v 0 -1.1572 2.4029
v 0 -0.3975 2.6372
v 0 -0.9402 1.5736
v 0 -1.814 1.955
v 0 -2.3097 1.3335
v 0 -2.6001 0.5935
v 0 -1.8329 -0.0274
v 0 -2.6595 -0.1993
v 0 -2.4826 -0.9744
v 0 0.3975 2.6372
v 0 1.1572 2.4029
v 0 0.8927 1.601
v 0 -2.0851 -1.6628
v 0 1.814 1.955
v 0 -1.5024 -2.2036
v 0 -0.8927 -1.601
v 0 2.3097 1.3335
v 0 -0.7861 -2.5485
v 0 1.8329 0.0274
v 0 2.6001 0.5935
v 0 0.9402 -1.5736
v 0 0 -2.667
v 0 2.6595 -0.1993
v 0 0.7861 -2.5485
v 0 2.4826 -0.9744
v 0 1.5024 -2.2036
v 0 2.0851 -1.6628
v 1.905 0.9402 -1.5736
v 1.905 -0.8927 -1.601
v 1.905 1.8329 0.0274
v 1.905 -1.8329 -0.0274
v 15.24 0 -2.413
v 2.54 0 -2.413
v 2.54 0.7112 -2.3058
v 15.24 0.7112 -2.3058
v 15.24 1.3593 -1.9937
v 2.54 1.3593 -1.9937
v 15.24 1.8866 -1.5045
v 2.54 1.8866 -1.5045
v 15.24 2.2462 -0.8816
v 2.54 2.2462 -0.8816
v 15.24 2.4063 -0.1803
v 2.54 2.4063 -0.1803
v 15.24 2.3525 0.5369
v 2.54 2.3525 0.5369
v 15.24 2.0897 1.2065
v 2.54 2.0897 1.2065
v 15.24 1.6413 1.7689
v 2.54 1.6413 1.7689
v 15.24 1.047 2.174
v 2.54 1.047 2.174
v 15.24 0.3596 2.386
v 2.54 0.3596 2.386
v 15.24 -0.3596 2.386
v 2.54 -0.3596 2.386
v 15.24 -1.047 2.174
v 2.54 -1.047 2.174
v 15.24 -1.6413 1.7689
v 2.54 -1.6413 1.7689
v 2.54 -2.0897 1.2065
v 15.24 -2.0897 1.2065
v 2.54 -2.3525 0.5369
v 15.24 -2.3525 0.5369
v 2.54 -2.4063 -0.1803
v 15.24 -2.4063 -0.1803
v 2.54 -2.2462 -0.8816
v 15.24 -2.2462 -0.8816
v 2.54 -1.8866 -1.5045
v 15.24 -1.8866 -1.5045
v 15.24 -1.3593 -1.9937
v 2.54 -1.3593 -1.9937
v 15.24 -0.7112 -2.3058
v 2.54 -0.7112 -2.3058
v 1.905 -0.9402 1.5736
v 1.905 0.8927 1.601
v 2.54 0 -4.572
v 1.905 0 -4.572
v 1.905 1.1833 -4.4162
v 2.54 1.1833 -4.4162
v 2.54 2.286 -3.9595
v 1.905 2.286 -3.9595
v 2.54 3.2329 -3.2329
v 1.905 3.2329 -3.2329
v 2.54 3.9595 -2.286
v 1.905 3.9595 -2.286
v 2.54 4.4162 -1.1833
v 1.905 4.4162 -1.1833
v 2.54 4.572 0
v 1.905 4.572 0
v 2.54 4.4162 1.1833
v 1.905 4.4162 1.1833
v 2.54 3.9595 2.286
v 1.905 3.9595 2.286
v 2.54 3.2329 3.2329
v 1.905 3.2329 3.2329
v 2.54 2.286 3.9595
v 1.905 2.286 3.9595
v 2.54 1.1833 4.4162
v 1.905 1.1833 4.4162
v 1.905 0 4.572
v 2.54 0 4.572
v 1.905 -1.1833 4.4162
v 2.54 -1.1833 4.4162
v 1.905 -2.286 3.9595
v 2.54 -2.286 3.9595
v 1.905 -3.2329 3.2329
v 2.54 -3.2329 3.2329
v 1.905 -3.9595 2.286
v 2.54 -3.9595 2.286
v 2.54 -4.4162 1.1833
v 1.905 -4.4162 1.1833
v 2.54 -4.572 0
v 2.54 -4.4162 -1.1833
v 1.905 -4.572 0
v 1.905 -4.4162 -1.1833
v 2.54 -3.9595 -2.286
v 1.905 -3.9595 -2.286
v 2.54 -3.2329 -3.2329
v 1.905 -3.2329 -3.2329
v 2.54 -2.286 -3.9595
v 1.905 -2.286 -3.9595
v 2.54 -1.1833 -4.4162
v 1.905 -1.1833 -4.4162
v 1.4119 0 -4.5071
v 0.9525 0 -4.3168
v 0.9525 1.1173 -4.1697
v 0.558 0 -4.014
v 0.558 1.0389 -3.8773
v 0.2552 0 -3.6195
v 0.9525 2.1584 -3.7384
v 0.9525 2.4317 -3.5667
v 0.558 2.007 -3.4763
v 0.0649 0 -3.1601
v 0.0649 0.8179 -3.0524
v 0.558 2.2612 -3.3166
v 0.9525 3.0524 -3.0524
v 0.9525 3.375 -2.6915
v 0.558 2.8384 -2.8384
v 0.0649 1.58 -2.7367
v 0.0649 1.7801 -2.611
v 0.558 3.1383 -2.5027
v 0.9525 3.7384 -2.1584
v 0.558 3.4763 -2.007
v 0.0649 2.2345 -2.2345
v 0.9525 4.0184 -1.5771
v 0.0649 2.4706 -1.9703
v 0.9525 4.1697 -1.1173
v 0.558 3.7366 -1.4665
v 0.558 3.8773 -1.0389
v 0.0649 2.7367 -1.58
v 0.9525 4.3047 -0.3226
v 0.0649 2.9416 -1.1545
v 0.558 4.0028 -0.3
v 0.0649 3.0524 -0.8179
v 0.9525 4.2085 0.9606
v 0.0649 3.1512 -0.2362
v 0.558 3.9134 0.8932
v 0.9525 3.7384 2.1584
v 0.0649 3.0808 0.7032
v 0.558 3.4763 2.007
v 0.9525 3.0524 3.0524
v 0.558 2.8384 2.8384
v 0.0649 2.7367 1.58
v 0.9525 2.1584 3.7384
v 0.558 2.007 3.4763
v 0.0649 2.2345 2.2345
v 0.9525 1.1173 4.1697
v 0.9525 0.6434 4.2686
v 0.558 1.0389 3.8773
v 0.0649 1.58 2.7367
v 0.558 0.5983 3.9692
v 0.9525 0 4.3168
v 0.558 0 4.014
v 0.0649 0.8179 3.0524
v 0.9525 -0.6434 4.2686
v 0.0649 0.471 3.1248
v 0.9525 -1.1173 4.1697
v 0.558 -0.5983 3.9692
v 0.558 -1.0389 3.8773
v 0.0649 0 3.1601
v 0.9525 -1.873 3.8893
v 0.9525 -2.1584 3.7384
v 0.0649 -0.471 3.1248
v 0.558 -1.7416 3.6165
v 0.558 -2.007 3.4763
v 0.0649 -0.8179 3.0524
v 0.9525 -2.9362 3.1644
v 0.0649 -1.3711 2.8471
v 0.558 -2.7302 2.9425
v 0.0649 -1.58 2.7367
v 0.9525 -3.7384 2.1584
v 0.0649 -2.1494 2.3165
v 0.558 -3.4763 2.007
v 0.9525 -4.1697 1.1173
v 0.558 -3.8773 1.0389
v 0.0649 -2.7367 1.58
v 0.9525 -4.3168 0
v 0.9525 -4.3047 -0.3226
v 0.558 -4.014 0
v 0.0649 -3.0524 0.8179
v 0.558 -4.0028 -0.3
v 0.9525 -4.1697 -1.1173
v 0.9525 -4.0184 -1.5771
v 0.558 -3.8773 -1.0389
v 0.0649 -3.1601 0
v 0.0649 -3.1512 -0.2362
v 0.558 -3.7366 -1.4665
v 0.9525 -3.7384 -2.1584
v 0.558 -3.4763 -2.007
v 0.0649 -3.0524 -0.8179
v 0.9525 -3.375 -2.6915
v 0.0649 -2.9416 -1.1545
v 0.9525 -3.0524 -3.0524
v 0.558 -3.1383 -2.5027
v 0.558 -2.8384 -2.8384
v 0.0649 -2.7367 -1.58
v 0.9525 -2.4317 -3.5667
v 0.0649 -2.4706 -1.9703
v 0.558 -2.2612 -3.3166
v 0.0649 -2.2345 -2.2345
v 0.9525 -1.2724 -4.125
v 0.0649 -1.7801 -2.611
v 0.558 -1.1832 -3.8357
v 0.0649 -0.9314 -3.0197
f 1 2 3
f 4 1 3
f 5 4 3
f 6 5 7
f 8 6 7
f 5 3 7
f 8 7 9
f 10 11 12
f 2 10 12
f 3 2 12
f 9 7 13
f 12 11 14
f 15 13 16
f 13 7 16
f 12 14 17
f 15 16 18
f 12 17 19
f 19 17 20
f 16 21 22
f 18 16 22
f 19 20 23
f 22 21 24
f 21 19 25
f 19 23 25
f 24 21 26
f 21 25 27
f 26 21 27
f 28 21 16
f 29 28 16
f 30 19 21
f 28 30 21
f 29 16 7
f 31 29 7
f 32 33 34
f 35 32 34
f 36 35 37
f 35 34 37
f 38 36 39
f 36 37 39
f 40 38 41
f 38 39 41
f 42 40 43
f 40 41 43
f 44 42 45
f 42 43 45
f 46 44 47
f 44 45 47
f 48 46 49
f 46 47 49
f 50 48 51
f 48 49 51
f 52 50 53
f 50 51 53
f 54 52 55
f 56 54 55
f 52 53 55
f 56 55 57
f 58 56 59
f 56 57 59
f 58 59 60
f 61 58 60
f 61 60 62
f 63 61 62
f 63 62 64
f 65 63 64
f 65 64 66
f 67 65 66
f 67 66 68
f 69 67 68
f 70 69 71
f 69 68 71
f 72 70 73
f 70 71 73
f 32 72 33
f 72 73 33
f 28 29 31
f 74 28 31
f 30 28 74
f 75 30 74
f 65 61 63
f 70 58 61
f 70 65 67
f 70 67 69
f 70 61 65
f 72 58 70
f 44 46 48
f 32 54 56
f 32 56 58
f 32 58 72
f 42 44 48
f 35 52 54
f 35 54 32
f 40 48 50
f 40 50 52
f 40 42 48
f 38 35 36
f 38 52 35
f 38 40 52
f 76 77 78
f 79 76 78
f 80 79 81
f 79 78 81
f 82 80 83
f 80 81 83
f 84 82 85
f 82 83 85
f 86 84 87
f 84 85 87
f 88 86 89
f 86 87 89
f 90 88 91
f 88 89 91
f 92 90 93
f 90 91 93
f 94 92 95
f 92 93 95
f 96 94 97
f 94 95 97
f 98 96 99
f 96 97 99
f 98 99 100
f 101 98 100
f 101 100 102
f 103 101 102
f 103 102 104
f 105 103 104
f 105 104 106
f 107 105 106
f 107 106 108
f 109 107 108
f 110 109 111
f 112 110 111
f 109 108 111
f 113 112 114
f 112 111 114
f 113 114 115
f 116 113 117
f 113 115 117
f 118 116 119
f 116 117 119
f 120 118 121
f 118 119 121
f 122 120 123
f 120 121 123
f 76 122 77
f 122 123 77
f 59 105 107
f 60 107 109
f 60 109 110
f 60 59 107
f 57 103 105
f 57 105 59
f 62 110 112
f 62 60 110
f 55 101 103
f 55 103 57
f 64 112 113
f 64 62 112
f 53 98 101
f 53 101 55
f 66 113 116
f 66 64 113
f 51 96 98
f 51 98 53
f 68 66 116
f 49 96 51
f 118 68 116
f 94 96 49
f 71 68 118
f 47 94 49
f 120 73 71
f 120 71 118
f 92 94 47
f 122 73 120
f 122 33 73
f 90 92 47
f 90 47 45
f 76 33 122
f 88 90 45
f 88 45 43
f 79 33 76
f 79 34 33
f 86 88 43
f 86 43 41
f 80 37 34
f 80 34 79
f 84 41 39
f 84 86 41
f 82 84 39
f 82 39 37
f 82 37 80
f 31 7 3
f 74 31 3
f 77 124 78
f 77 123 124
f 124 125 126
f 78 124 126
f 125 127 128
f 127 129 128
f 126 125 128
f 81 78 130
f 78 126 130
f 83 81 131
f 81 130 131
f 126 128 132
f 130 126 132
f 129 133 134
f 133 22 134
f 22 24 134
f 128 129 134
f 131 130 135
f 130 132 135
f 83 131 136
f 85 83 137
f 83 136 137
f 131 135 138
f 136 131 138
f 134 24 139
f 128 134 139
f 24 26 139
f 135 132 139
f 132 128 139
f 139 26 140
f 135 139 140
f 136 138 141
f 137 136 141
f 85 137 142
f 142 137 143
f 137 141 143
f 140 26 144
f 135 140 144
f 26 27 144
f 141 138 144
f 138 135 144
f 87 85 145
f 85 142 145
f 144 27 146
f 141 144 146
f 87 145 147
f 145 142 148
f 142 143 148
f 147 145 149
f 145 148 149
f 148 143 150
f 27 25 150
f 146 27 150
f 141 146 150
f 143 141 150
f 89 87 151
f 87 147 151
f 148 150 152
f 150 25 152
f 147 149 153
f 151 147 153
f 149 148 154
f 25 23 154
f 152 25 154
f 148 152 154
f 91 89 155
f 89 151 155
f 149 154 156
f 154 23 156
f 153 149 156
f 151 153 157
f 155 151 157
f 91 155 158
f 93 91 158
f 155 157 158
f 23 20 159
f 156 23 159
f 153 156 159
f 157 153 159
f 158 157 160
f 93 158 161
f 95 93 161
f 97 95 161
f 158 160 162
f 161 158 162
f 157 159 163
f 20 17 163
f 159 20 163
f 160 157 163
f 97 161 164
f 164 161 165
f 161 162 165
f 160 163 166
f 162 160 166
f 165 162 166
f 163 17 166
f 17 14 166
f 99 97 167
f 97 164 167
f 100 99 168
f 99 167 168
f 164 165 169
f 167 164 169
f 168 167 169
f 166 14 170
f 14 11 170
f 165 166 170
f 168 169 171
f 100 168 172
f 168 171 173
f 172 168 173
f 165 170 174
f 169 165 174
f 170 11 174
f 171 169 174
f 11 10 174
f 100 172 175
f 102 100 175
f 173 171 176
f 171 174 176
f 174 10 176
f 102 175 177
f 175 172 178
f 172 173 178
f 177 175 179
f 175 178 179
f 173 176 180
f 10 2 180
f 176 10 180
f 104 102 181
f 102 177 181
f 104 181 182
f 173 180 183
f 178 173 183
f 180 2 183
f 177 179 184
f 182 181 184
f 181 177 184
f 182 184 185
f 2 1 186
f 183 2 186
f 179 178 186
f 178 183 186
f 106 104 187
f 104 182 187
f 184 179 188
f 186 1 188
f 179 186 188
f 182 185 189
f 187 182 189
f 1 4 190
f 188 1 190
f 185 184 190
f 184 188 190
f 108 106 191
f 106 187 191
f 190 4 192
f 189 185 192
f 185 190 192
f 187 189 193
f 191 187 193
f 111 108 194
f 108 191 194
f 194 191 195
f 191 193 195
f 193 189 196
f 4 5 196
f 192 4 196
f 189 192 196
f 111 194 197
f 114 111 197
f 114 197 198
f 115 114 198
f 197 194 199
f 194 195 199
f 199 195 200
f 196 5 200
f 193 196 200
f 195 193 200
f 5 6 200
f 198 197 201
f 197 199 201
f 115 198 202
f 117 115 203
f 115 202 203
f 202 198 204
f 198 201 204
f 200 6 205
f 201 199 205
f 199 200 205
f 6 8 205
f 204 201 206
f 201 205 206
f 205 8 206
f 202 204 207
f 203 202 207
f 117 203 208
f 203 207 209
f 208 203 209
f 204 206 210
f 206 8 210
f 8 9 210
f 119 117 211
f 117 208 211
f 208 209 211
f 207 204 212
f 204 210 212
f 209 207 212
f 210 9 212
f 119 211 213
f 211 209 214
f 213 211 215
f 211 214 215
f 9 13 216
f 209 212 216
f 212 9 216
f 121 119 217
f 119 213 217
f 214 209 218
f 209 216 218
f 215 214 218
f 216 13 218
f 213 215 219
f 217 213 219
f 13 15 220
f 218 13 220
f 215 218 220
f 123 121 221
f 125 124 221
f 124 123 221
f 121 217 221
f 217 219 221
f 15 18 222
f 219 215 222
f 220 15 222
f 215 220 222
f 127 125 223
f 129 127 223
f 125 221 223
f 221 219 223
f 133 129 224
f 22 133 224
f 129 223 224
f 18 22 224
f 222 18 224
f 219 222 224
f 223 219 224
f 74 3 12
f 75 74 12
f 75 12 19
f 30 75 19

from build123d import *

# Parameters (mm, degrees)
SKETCH1_R           = 4.572
BOSS_EXTRUDE1_DEPTH = 2.54
SKETCH2_R           = 2.413
BOSS_EXTRUDE2_DEPTH = 12.7
FILLET1_R           = 1.905
CUT_EXTRUDE1_DEPTH  = 1.905


with BuildPart() as part:
    # Sketch1 → Boss-Extrude1 (new body)
    with BuildSketch(Plane(origin=(0, 0, 0), x_dir=(0, 0, -1), z_dir=(1, 0, 0))):
        Circle(SKETCH1_R)
    extrude(amount=BOSS_EXTRUDE1_DEPTH)

    # Sketch2 → Boss-Extrude2 (add)
    with BuildSketch(Plane(origin=(2.54, 0, 0), x_dir=(0, 0, -1), z_dir=(1, 0, 0))):
        Circle(SKETCH2_R)
    extrude(amount=BOSS_EXTRUDE2_DEPTH)

    # Fillet1
    fillet1_edges = [part.edges().sort_by_distance(p)[0] for p in [
        (0, 0, 4.572),
    ]]
    fillet(fillet1_edges, radius=FILLET1_R)

    # Sketch3 → Cut-Extrude1 (cut)
    with BuildSketch(Plane.ZY):
        Polygon((1.573613406, -0.940185716), (1.601031418, 0.892696328), (0.027418011, 1.832882044), (-1.573613406, 0.940185716), (-1.601031418, -0.892696328), (-0.027418011, -1.832882044), align=None)
    extrude(amount=-CUT_EXTRUDE1_DEPTH, mode=Mode.SUBTRACT)


solid = part.part
